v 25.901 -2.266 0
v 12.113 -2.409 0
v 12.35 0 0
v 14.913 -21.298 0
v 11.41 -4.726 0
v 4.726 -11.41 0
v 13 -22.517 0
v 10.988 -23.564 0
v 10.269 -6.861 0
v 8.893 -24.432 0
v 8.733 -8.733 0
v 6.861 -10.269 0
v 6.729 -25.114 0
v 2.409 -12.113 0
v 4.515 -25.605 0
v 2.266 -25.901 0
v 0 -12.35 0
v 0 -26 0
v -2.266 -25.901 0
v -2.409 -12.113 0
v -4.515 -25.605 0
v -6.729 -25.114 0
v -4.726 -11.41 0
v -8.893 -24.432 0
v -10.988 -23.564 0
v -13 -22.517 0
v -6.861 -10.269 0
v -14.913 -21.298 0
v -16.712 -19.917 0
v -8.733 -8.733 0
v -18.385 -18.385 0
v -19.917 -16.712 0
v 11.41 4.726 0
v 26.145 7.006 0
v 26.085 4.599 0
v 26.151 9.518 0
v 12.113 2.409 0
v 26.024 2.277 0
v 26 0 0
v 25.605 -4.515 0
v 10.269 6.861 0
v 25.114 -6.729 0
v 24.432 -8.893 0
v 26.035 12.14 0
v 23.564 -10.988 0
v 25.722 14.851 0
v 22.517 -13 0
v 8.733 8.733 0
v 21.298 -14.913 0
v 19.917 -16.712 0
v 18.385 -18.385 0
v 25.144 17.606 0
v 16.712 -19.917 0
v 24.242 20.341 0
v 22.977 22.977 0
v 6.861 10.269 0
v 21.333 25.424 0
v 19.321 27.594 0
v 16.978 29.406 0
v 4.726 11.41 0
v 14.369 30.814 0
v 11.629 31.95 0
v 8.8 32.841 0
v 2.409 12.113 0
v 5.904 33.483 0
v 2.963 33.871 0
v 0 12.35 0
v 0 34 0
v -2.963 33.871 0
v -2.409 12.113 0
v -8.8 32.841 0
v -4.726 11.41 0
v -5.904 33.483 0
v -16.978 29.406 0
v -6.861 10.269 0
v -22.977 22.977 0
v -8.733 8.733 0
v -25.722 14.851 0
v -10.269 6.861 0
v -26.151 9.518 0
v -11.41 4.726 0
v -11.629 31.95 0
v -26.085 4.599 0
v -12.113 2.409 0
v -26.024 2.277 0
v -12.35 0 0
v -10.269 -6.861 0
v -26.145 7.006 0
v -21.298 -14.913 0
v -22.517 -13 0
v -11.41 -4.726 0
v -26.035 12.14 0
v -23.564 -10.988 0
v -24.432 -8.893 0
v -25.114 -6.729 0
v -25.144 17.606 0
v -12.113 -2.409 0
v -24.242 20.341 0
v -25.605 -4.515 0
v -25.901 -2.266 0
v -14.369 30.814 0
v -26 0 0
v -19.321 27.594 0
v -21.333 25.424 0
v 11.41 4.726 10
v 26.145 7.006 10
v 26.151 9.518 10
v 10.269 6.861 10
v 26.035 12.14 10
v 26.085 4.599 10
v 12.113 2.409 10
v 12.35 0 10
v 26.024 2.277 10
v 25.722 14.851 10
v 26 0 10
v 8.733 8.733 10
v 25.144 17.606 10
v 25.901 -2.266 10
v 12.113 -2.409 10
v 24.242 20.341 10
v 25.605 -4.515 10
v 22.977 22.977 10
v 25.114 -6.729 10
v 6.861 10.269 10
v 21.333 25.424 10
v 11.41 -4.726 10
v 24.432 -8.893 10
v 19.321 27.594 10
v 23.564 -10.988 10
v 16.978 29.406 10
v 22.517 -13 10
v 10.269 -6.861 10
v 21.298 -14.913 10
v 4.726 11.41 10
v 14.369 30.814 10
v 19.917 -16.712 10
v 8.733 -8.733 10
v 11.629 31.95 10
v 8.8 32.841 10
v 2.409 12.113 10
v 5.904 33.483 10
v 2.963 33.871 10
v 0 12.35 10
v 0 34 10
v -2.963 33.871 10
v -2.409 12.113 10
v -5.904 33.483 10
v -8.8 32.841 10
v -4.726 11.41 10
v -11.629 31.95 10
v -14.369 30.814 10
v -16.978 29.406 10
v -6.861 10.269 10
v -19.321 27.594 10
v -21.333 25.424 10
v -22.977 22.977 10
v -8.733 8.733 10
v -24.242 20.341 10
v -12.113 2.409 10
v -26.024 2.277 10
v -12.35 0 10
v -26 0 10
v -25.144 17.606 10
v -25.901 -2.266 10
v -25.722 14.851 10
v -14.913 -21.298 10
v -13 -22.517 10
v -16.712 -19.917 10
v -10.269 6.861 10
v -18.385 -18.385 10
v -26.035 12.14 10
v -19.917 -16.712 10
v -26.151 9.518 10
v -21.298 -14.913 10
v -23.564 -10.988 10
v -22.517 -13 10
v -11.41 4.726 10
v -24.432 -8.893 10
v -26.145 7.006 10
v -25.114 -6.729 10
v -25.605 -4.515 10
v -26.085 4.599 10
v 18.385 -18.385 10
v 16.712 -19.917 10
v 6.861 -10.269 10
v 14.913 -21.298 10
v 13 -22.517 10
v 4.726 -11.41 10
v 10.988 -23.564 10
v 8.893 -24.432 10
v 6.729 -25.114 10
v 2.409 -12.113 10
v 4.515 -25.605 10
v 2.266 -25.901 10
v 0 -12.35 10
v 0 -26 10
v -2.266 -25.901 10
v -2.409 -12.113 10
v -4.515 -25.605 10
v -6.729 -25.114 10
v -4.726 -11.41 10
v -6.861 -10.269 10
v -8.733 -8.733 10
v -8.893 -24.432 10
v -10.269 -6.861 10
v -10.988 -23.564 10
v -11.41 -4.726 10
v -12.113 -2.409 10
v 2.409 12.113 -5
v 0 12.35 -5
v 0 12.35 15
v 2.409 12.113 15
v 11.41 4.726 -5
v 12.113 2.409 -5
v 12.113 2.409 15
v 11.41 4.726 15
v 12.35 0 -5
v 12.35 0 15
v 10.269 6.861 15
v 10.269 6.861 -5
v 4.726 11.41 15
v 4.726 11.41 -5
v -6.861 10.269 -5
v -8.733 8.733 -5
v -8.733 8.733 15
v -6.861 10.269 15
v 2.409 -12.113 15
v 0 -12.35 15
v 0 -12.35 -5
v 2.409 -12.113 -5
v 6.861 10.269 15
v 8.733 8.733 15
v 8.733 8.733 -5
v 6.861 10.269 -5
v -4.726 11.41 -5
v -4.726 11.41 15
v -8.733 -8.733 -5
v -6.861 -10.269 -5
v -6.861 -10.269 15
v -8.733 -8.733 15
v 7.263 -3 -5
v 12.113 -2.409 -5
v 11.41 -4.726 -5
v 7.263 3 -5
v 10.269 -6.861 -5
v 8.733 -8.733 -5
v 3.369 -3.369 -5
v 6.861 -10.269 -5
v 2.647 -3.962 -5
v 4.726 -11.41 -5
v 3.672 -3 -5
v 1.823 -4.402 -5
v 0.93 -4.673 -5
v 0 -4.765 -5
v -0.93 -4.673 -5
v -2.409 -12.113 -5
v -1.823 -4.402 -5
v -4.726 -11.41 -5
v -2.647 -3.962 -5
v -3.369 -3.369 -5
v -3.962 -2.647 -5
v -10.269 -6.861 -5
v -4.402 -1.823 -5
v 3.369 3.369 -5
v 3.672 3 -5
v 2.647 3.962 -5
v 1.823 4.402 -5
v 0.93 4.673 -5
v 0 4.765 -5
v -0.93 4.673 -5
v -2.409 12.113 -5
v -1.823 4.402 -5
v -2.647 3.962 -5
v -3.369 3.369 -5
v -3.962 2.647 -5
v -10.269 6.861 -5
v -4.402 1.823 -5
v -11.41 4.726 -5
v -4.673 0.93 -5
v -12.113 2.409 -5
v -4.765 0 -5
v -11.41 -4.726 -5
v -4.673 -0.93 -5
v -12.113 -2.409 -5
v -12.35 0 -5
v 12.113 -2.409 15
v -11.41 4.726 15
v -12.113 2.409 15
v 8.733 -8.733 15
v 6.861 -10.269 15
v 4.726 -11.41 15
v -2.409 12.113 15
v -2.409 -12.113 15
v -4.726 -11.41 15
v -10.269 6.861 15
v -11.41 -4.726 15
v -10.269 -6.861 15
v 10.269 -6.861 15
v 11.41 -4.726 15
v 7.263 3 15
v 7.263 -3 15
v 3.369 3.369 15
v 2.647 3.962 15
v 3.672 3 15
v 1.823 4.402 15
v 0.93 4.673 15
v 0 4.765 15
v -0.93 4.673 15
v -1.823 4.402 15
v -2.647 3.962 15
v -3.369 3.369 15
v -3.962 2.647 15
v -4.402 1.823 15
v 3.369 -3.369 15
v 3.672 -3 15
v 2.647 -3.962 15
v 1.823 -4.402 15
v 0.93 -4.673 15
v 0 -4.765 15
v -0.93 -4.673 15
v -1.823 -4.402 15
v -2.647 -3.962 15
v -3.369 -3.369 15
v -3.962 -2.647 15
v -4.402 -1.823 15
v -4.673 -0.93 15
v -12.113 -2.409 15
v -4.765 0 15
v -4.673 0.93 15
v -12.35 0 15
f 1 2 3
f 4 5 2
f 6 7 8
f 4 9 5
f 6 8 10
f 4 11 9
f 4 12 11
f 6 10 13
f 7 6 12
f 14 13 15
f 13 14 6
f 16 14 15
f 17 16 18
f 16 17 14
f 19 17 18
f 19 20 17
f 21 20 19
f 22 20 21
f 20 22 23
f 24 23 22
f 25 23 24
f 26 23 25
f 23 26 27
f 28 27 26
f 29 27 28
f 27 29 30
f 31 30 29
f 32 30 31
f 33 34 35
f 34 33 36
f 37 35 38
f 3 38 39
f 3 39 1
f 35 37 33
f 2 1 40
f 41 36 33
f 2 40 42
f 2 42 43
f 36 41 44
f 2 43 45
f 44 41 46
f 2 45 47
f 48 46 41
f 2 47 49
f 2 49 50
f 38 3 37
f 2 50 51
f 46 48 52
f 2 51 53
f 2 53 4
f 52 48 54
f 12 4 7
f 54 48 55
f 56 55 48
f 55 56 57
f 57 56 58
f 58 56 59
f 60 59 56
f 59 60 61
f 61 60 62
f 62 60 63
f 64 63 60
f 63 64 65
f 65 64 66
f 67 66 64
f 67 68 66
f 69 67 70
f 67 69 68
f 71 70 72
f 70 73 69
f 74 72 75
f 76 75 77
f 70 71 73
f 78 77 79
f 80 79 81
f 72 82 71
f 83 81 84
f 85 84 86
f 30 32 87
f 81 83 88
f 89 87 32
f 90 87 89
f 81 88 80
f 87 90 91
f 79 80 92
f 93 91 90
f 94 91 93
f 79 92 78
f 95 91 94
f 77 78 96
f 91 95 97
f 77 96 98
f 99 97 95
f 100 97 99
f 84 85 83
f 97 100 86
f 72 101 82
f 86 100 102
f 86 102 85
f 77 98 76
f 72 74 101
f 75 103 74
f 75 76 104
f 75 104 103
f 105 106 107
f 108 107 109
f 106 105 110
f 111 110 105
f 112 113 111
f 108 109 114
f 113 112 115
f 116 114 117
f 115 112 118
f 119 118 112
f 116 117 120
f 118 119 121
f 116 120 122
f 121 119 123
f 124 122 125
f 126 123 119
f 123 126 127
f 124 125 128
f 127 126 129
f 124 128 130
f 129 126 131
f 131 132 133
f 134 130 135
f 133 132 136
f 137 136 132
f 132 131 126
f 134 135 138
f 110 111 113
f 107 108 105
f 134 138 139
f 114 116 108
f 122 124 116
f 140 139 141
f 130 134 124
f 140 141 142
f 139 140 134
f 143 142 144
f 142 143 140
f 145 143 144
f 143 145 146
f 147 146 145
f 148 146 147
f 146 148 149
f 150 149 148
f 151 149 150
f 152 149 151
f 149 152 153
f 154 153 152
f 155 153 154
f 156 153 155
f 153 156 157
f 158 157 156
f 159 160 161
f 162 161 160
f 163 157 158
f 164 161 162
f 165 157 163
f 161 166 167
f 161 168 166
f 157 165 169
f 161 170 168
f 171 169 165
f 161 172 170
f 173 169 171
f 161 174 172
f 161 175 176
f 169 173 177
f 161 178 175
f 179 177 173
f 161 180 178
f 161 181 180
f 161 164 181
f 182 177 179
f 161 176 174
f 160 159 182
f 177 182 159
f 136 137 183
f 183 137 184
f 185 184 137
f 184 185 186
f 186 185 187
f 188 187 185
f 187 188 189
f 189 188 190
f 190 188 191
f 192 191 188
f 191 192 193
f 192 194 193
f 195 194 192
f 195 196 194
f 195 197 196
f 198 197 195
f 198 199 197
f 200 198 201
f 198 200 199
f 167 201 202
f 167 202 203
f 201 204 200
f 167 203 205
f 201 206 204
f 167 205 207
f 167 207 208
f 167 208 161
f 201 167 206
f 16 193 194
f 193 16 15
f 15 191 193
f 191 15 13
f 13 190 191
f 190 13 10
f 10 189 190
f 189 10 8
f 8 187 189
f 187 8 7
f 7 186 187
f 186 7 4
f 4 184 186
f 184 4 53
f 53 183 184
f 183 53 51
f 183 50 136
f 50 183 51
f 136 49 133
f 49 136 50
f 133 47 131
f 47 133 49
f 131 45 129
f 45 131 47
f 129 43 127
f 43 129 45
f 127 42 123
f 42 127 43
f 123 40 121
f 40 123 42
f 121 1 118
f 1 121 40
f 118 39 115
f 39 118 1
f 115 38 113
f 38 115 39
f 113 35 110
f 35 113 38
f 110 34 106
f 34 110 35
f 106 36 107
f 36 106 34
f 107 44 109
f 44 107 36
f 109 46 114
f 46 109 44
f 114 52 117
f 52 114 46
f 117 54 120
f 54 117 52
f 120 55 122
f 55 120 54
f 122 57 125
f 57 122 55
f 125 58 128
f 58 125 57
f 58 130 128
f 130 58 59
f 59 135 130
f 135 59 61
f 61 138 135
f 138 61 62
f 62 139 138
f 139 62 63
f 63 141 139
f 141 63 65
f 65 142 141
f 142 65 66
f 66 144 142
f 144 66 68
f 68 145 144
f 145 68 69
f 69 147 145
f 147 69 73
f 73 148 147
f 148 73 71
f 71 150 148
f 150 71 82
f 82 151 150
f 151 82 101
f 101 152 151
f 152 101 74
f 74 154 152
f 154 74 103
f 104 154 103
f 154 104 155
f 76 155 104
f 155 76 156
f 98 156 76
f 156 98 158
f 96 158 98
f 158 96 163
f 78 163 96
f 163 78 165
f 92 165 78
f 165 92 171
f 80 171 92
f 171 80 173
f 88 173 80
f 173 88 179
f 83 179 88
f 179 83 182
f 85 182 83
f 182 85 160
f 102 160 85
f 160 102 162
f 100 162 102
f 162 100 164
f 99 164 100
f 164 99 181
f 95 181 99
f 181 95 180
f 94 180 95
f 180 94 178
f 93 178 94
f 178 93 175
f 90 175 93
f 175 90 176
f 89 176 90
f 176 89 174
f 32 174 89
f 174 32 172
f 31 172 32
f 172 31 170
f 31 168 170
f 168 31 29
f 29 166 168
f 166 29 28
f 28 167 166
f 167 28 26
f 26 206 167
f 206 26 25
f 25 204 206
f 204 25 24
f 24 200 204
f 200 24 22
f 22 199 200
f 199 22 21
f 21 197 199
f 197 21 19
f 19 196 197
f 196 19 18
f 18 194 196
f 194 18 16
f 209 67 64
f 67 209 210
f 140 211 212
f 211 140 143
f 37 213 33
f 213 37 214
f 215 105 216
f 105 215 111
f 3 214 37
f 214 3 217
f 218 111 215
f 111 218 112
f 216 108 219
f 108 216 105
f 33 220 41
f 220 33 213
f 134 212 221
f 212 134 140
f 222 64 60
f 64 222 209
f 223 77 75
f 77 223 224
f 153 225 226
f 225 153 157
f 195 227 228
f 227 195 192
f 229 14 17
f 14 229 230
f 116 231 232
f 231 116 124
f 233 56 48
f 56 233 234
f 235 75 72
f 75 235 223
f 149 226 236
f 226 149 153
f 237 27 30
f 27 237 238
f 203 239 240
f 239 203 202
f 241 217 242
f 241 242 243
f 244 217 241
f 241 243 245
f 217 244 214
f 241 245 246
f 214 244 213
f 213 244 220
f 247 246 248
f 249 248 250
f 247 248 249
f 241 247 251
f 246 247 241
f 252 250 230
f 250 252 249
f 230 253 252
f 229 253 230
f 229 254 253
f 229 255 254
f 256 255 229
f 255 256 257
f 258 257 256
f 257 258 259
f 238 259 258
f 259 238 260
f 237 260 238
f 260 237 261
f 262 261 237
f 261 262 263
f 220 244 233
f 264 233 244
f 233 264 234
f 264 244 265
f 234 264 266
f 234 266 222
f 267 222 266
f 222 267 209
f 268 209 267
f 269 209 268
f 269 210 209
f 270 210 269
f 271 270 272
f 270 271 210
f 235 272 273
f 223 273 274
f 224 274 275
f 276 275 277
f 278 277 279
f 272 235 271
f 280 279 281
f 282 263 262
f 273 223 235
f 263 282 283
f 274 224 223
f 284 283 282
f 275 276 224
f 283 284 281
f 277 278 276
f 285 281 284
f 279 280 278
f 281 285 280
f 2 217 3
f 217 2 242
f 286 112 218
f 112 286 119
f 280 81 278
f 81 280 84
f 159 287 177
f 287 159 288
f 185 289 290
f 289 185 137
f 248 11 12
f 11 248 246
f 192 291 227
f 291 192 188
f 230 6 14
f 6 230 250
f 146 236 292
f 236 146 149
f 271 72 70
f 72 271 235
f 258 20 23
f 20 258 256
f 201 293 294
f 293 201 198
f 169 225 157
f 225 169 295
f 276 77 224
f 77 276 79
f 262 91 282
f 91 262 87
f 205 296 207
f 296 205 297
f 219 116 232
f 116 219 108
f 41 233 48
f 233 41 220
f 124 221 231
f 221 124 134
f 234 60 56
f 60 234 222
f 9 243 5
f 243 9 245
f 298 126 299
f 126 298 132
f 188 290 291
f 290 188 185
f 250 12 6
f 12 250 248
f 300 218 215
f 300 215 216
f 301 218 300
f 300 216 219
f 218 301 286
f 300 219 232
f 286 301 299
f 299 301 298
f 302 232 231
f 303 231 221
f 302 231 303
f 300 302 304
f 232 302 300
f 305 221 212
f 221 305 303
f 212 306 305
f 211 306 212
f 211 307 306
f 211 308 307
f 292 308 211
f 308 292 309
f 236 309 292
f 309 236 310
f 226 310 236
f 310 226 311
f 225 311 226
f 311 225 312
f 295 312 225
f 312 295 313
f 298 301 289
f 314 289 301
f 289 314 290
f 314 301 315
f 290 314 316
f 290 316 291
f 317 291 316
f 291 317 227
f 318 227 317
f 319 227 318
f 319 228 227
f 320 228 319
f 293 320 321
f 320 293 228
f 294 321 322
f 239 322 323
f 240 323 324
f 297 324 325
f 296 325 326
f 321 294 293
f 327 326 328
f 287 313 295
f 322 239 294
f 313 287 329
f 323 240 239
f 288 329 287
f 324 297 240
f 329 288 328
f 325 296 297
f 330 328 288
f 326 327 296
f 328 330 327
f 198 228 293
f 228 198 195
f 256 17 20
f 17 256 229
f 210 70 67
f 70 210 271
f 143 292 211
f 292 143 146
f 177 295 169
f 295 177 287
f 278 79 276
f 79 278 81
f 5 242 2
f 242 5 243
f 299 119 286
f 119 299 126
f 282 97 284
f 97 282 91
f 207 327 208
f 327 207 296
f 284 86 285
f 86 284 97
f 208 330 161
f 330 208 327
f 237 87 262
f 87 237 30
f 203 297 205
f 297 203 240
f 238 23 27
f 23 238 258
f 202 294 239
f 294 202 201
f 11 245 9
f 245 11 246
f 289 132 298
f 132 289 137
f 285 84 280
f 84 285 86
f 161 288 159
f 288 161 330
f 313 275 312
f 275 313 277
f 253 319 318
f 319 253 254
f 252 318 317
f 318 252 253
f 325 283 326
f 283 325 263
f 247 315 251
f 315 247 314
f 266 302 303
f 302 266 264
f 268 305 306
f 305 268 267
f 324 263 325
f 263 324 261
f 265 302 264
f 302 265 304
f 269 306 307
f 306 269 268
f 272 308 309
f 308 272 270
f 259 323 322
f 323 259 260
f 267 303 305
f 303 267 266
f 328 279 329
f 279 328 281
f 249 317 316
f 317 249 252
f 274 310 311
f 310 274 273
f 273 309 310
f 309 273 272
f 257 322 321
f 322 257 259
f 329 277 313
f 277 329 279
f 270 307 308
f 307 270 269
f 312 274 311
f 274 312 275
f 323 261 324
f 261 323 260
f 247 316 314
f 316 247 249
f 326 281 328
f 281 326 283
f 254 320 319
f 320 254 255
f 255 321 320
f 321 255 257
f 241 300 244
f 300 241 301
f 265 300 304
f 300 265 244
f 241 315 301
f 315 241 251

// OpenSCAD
$fn = 32;

// ----------------------------------------------------------------------
// Cam: base radius 26 mm with a 8 mm lift over 180 degrees
// ----------------------------------------------------------------------

// --- parameters (mm) ---
base_r = 26;              // base radius
lift = 8;                 // lift height above the base radius
lift_span = 180;          // angular width of the lift
lift_start = 0;           // angle where the lift starts
cam_t = 10;               // cam plate thickness
hub_d = 24.7;             // hub diameter
hub_h = 20;               // hub height
bore_d = 9.53;            // bore
key_w = 6;                // keyway width
key_depth = 3;            // keyway depth

cam_profile = [[26, 0], [26.024, 2.277], [26.085, 4.599], [26.145, 7.006], [26.151, 9.518], [26.035, 12.14], [25.722, 14.851], [25.144, 17.606], [24.242, 20.341], [22.977, 22.977], [21.333, 25.424], [19.321, 27.594], [16.978, 29.406], [14.369, 30.814], [11.629, 31.95], [8.8, 32.841], [5.904, 33.483], [2.963, 33.871], [0, 34], [-2.963, 33.871], [-5.904, 33.483], [-8.8, 32.841], [-11.629, 31.95], [-14.369, 30.814], [-16.978, 29.406], [-19.321, 27.594], [-21.333, 25.424], [-22.977, 22.977], [-24.242, 20.341], [-25.144, 17.606], [-25.722, 14.851], [-26.035, 12.14], [-26.151, 9.518], [-26.145, 7.006], [-26.085, 4.599], [-26.024, 2.277], [-26, 0], [-25.901, -2.266], [-25.605, -4.515], [-25.114, -6.729], [-24.432, -8.893], [-23.564, -10.988], [-22.517, -13], [-21.298, -14.913], [-19.917, -16.712], [-18.385, -18.385], [-16.712, -19.917], [-14.913, -21.298], [-13, -22.517], [-10.988, -23.564], [-8.893, -24.432], [-6.729, -25.114], [-4.515, -25.605], [-2.266, -25.901], [0, -26], [2.266, -25.901], [4.515, -25.605], [6.729, -25.114], [8.893, -24.432], [10.988, -23.564], [13, -22.517], [14.913, -21.298], [16.712, -19.917], [18.385, -18.385], [19.917, -16.712], [21.298, -14.913], [22.517, -13], [23.564, -10.988], [24.432, -8.893], [25.114, -6.729], [25.605, -4.515], [25.901, -2.266]];

difference() {
  union() {
    linear_extrude(height = cam_t) polygon(cam_profile);
    /* hub, proud of the cam plate on both sides */
    translate([0, 0, -5]) cylinder(h = hub_h, d = hub_d);
  }
  /* bore through the hub, 2.5 mm clear on both faces */
  translate([0, 0, -7.5]) cylinder(h = hub_h + 5, d = bore_d);
  /* keyway, milled through the whole hub */
  translate([1.763, -3, -7.5]) cube([5.5, 6, 25]);
}
